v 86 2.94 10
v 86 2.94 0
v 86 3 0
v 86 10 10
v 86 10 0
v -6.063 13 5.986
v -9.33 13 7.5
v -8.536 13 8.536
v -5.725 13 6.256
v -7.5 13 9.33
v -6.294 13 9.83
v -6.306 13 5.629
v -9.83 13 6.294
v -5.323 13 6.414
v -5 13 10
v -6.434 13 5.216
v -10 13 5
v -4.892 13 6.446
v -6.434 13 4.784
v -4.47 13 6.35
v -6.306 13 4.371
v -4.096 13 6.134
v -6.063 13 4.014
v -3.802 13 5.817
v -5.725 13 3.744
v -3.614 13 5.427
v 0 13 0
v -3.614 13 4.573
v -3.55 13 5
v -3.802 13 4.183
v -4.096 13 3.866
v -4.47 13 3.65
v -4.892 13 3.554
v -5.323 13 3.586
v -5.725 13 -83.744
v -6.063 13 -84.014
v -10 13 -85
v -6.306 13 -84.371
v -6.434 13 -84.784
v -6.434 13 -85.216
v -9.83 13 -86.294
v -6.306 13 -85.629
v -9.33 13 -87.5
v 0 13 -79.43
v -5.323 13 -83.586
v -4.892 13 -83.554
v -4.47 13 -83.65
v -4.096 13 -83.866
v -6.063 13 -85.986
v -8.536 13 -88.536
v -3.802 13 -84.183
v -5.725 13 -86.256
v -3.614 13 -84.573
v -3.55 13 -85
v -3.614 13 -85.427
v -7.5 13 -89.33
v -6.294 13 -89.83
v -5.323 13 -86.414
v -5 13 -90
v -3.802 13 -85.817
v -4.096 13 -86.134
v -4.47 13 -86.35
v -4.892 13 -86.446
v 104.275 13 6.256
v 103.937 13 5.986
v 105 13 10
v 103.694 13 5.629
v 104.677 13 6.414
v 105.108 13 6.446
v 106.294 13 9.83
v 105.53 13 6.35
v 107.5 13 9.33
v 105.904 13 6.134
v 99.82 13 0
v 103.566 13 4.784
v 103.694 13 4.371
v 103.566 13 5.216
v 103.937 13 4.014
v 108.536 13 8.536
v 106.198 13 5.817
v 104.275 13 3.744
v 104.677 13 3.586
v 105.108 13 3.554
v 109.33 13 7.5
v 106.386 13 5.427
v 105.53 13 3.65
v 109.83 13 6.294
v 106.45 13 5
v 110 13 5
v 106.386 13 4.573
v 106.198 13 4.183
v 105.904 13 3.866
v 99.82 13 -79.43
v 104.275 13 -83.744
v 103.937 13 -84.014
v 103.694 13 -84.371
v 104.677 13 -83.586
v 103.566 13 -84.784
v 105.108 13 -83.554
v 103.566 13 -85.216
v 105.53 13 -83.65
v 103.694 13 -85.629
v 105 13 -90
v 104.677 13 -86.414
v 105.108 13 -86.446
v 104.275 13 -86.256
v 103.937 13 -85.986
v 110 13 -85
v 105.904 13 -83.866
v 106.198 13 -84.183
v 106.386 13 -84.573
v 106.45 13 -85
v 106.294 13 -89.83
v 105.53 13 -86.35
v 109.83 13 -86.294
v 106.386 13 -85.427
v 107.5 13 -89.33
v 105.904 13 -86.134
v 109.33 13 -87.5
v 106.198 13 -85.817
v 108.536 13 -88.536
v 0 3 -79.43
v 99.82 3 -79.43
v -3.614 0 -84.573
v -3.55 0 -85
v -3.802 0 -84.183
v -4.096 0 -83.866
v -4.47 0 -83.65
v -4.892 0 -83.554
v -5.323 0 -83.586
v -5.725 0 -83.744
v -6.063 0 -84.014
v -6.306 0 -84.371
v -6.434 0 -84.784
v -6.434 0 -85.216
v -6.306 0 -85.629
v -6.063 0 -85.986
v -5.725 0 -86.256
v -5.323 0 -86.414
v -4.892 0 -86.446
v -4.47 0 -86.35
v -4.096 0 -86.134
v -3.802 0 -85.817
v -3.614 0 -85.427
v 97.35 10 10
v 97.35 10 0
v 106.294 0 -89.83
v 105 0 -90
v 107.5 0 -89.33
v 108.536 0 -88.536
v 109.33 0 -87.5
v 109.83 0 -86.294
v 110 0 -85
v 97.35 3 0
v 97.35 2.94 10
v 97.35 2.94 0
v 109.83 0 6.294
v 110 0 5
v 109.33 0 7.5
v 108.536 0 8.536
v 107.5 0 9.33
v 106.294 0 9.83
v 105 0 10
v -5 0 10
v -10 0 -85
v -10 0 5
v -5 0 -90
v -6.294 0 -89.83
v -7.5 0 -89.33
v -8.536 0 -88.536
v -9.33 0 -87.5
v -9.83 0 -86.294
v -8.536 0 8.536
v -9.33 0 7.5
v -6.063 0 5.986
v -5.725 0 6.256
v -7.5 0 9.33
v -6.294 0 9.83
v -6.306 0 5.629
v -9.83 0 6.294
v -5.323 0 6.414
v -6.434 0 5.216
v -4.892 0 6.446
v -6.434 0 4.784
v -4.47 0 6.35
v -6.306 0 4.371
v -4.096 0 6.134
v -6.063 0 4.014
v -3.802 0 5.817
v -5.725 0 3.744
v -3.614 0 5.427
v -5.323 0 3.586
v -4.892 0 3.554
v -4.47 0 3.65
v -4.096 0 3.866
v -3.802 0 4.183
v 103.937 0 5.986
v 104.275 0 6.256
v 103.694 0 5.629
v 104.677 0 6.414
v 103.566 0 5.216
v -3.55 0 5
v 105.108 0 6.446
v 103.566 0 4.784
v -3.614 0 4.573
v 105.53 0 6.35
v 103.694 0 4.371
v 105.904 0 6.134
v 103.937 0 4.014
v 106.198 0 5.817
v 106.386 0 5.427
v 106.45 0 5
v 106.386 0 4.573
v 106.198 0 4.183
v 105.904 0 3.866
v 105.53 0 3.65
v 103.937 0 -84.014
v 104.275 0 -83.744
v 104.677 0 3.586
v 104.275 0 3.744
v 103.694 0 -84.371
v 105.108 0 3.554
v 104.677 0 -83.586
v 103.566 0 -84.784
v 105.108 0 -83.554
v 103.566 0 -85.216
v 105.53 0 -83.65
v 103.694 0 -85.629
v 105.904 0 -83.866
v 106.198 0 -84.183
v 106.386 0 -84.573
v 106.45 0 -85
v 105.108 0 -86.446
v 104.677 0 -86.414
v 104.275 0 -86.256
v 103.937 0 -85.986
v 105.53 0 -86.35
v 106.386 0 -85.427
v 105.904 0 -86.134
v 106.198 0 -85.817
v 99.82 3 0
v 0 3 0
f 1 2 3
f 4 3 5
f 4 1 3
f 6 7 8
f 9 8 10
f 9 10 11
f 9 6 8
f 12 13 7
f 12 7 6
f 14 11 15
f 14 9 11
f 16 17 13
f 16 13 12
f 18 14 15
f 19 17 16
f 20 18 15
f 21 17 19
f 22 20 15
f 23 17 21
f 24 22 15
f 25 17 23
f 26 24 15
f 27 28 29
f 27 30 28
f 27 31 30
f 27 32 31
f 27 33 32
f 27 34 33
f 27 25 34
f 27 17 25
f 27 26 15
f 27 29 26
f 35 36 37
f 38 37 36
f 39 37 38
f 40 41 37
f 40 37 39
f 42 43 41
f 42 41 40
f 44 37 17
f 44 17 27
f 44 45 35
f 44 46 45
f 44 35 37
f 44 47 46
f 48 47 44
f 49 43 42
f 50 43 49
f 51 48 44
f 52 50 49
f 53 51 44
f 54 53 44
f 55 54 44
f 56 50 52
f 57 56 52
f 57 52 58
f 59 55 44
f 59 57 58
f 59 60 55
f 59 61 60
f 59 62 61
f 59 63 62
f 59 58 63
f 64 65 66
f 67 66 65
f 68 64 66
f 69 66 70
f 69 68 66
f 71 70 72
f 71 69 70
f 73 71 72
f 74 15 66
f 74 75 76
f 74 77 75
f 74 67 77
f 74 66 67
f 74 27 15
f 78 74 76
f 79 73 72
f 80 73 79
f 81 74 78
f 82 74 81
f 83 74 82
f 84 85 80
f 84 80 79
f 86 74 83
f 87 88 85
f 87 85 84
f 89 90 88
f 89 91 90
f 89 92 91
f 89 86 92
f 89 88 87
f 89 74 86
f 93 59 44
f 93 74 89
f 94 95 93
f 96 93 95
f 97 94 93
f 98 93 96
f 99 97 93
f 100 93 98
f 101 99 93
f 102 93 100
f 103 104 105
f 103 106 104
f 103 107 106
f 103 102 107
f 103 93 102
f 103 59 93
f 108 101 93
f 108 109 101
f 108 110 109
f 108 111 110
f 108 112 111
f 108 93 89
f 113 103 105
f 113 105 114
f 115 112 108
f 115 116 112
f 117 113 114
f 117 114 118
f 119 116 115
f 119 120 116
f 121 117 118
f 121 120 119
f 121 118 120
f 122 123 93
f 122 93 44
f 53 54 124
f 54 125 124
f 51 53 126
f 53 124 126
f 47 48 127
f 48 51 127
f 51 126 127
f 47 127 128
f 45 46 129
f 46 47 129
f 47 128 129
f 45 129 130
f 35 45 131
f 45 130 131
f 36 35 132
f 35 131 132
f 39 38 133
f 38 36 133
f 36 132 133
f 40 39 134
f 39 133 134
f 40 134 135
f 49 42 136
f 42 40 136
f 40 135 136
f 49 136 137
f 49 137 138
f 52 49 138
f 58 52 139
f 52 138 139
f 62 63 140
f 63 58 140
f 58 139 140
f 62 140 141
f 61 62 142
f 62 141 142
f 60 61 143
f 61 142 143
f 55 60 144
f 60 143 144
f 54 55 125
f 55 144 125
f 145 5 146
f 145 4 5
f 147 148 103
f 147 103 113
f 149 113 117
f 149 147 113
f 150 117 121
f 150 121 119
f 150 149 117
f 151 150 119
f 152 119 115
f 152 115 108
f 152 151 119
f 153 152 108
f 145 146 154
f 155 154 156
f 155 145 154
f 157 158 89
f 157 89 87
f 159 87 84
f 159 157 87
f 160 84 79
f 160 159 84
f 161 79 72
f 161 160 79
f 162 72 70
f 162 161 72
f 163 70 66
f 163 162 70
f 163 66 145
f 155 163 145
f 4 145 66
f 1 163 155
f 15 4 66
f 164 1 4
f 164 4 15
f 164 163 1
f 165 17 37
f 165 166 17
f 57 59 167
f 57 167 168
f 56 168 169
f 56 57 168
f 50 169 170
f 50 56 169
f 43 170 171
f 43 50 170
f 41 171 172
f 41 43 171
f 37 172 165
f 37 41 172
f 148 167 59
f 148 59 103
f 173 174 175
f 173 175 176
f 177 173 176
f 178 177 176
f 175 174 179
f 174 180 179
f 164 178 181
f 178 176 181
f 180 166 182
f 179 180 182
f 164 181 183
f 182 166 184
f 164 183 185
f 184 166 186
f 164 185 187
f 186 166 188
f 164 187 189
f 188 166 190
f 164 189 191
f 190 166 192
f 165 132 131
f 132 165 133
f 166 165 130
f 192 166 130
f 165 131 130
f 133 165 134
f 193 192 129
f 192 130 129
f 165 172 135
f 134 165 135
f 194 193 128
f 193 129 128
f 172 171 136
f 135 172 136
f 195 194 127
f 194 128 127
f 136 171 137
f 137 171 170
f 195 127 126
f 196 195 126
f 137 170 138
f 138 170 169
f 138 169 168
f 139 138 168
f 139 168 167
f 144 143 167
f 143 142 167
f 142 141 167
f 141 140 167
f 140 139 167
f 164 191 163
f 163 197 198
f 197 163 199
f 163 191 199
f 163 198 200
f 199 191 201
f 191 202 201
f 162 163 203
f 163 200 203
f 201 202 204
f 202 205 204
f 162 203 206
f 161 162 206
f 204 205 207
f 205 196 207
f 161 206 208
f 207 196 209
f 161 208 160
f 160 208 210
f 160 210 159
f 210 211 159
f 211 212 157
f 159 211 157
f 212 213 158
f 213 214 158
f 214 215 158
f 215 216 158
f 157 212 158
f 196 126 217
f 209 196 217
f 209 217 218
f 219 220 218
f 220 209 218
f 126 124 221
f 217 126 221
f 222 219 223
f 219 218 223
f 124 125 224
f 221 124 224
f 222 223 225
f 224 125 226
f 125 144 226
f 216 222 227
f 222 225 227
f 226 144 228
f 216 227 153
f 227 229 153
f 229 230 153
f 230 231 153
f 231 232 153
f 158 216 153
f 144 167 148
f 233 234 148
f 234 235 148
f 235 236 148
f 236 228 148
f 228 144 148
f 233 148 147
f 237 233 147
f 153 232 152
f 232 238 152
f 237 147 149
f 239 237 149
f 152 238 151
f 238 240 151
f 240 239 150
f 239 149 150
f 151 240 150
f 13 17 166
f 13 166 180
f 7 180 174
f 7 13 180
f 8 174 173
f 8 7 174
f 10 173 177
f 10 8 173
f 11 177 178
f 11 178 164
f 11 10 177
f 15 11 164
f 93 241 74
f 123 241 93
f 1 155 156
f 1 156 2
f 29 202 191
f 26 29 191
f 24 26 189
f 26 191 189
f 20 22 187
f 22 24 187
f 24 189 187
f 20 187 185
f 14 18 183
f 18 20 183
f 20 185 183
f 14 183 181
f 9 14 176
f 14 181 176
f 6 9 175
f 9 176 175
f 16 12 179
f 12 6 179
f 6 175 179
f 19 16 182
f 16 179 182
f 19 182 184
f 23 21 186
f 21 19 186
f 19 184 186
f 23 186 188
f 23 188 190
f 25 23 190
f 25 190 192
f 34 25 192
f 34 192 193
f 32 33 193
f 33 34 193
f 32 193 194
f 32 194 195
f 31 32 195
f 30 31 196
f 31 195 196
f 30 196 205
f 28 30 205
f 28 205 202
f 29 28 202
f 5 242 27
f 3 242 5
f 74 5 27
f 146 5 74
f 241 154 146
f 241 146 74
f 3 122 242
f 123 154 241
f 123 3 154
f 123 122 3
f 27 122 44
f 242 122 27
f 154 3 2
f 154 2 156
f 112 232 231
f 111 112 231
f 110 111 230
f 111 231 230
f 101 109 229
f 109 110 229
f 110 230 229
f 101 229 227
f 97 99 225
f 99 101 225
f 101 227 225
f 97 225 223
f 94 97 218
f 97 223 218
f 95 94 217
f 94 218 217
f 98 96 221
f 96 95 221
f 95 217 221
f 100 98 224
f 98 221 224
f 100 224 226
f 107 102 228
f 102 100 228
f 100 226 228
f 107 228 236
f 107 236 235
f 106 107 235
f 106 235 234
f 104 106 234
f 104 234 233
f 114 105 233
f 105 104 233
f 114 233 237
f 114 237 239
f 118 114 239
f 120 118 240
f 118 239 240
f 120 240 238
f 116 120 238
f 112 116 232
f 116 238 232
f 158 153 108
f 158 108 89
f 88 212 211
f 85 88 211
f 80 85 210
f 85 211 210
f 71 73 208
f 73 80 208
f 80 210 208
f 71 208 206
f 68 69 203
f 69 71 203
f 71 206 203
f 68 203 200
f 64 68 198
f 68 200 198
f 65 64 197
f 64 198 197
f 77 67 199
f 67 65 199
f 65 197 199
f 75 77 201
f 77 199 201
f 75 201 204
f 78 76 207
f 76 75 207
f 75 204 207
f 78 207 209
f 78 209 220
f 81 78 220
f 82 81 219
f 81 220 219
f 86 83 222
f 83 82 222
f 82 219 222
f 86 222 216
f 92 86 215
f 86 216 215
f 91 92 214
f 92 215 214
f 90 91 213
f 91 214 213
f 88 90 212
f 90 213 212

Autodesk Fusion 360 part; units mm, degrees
sketch "hackpad base" plane through (0, 0, 0) normal (0, 1, 0) x (1, 0, 0)
  line L0 (0, 79.43) -> (0, 0)
  line L1 (0, 0) -> (99.82, 0)
  line L2 (99.82, 0) -> (99.82, 79.43)
  line L3 (99.82, 79.43) -> (0, 79.43)
  line L4 (-10, 90) -> (110, 90)
  line L5 (-10, -10) -> (-10, 90)
  line L6 (110, -10) -> (-10, -10)
  line L7 (110, 90) -> (110, -10)
  circle A0 centre (-5, -5) radius 1.45
  circle A1 centre (105, -5) radius 1.45
  circle A2 centre (105, 85) radius 1.45
  circle A3 centre (-5, 85) radius 1.45
extrude "Extrude1" add sketch "hackpad base" along normal blind 3 contours L0 L1 L2 L3 | L4 L5 L6 L7 makes body 1
extrude "Extrude2" add sketch "hackpad base" along normal blind 13 bodies 1
sketch "yes" plane through (0, 13, 0) normal (0, 1, 0) x (1, 0, 0)
  line L0 (4.775, 74.075) -> (17.775, 74.075)
  line L1 (4.775, 60.075) -> (17.775, 60.075)
  line L2 (4.275, 73.575) -> (4.275, 60.575)
  line L3 (18.275, 73.575) -> (18.275, 60.575)
  arc A0 (4.775, 74.075) -> (4.275, 73.575) centre (4.775, 73.575) ccw
  arc A1 (18.275, 73.575) -> (17.775, 74.075) centre (17.775, 73.575) ccw
  arc A2 (4.275, 60.575) -> (4.775, 60.075) centre (4.775, 60.575) ccw
  arc A3 (17.775, 60.075) -> (18.275, 60.575) centre (17.775, 60.575) ccw
  line L4 (23.825, 74.075) -> (36.825, 74.075)
  line L5 (23.825, 60.075) -> (36.825, 60.075)
  line L6 (23.325, 73.575) -> (23.325, 60.575)
  line L7 (37.325, 73.575) -> (37.325, 60.575)
  arc A4 (23.825, 74.075) -> (23.325, 73.575) centre (23.825, 73.575) ccw
  arc A5 (37.325, 73.575) -> (36.825, 74.075) centre (36.825, 73.575) ccw
  arc A6 (23.325, 60.575) -> (23.825, 60.075) centre (23.825, 60.575) ccw
  arc A7 (36.825, 60.075) -> (37.325, 60.575) centre (36.825, 60.575) ccw
  line L8 (42.875, 74.075) -> (55.875, 74.075)
  line L9 (42.875, 60.075) -> (55.875, 60.075)
  line L10 (42.375, 73.575) -> (42.375, 60.575)
  line L11 (56.375, 73.575) -> (56.375, 60.575)
  arc A8 (42.875, 74.075) -> (42.375, 73.575) centre (42.875, 73.575) ccw
  arc A9 (56.375, 73.575) -> (55.875, 74.075) centre (55.875, 73.575) ccw
  arc A10 (42.375, 60.575) -> (42.875, 60.075) centre (42.875, 60.575) ccw
  arc A11 (55.875, 60.075) -> (56.375, 60.575) centre (55.875, 60.575) ccw
  line L12 (61.925, 74.075) -> (74.925, 74.075)
  line L13 (61.925, 60.075) -> (74.925, 60.075)
  line L14 (61.425, 73.575) -> (61.425, 60.575)
  line L15 (75.425, 73.575) -> (75.425, 60.575)
  arc A12 (61.925, 74.075) -> (61.425, 73.575) centre (61.925, 73.575) ccw
  arc A13 (75.425, 73.575) -> (74.925, 74.075) centre (74.925, 73.575) ccw
  arc A14 (61.425, 60.575) -> (61.925, 60.075) centre (61.925, 60.575) ccw
  arc A15 (74.925, 60.075) -> (75.425, 60.575) centre (74.925, 60.575) ccw
  line L16 (4.775, 55.025) -> (17.775, 55.025)
  line L17 (4.775, 41.025) -> (17.775, 41.025)
  line L18 (4.275, 54.525) -> (4.275, 41.525)
  line L19 (18.275, 54.525) -> (18.275, 41.525)
  arc A16 (4.775, 55.025) -> (4.275, 54.525) centre (4.775, 54.525) ccw
  arc A17 (18.275, 54.525) -> (17.775, 55.025) centre (17.775, 54.525) ccw
  arc A18 (4.275, 41.525) -> (4.775, 41.025) centre (4.775, 41.525) ccw
  arc A19 (17.775, 41.025) -> (18.275, 41.525) centre (17.775, 41.525) ccw
  line L20 (23.825, 55.025) -> (36.825, 55.025)
  line L21 (23.825, 41.025) -> (36.825, 41.025)
  line L22 (23.325, 54.525) -> (23.325, 41.525)
  line L23 (37.325, 54.525) -> (37.325, 41.525)
  arc A20 (23.825, 55.025) -> (23.325, 54.525) centre (23.825, 54.525) ccw
  arc A21 (37.325, 54.525) -> (36.825, 55.025) centre (36.825, 54.525) ccw
  arc A22 (23.325, 41.525) -> (23.825, 41.025) centre (23.825, 41.525) ccw
  arc A23 (36.825, 41.025) -> (37.325, 41.525) centre (36.825, 41.525) ccw
  line L24 (42.875, 55.025) -> (55.875, 55.025)
  line L25 (42.875, 41.025) -> (55.875, 41.025)
  line L26 (42.375, 54.525) -> (42.375, 41.525)
  line L27 (56.375, 54.525) -> (56.375, 41.525)
  arc A24 (42.875, 55.025) -> (42.375, 54.525) centre (42.875, 54.525) ccw
  arc A25 (56.375, 54.525) -> (55.875, 55.025) centre (55.875, 54.525) ccw
  arc A26 (42.375, 41.525) -> (42.875, 41.025) centre (42.875, 41.525) ccw
  arc A27 (55.875, 41.025) -> (56.375, 41.525) centre (55.875, 41.525) ccw
  line L28 (61.925, 55.025) -> (74.925, 55.025)
  line L29 (61.925, 41.025) -> (74.925, 41.025)
  line L30 (61.425, 54.525) -> (61.425, 41.525)
  line L31 (75.425, 54.525) -> (75.425, 41.525)
  arc A28 (61.925, 55.025) -> (61.425, 54.525) centre (61.925, 54.525) ccw
  arc A29 (75.425, 54.525) -> (74.925, 55.025) centre (74.925, 54.525) ccw
  arc A30 (61.425, 41.525) -> (61.925, 41.025) centre (61.925, 41.525) ccw
  arc A31 (74.925, 41.025) -> (75.425, 41.525) centre (74.925, 41.525) ccw
  line L32 (4.775, 35.975) -> (17.775, 35.975)
  line L33 (4.775, 21.975) -> (17.775, 21.975)
  line L34 (4.275, 35.475) -> (4.275, 22.475)
  line L35 (18.275, 35.475) -> (18.275, 22.475)
  arc A32 (4.775, 35.975) -> (4.275, 35.475) centre (4.775, 35.475) ccw
  arc A33 (18.275, 35.475) -> (17.775, 35.975) centre (17.775, 35.475) ccw
  arc A34 (4.275, 22.475) -> (4.775, 21.975) centre (4.775, 22.475) ccw
  arc A35 (17.775, 21.975) -> (18.275, 22.475) centre (17.775, 22.475) ccw
  line L36 (23.825, 35.975) -> (36.825, 35.975)
  line L37 (23.825, 21.975) -> (36.825, 21.975)
  line L38 (23.325, 35.475) -> (23.325, 22.475)
  line L39 (37.325, 35.475) -> (37.325, 22.475)
  arc A36 (23.825, 35.975) -> (23.325, 35.475) centre (23.825, 35.475) ccw
  arc A37 (37.325, 35.475) -> (36.825, 35.975) centre (36.825, 35.475) ccw
  arc A38 (23.325, 22.475) -> (23.825, 21.975) centre (23.825, 22.475) ccw
  arc A39 (36.825, 21.975) -> (37.325, 22.475) centre (36.825, 22.475) ccw
  line L40 (42.875, 35.975) -> (55.875, 35.975)
  line L41 (42.875, 21.975) -> (55.875, 21.975)
  line L42 (42.375, 35.475) -> (42.375, 22.475)
  line L43 (56.375, 35.475) -> (56.375, 22.475)
  arc A40 (42.875, 35.975) -> (42.375, 35.475) centre (42.875, 35.475) ccw
  arc A41 (56.375, 35.475) -> (55.875, 35.975) centre (55.875, 35.475) ccw
  arc A42 (42.375, 22.475) -> (42.875, 21.975) centre (42.875, 22.475) ccw
  arc A43 (55.875, 21.975) -> (56.375, 22.475) centre (55.875, 22.475) ccw
  line L44 (61.925, 35.975) -> (74.925, 35.975)
  line L45 (61.925, 21.975) -> (74.925, 21.975)
  line L46 (61.425, 35.475) -> (61.425, 22.475)
  line L47 (75.425, 35.475) -> (75.425, 22.475)
  arc A44 (61.925, 35.975) -> (61.425, 35.475) centre (61.925, 35.475) ccw
  arc A45 (75.425, 35.475) -> (74.925, 35.975) centre (74.925, 35.475) ccw
  arc A46 (61.425, 22.475) -> (61.925, 21.975) centre (61.925, 22.475) ccw
  arc A47 (74.925, 21.975) -> (75.425, 22.475) centre (74.925, 22.475) ccw
  line L48 (4.775, 16.925) -> (17.775, 16.925)
  line L49 (4.775, 2.925) -> (17.775, 2.925)
  line L50 (4.275, 16.425) -> (4.275, 3.425)
  line L51 (18.275, 16.425) -> (18.275, 3.425)
  arc A48 (4.775, 16.925) -> (4.275, 16.425) centre (4.775, 16.425) ccw
  arc A49 (18.275, 16.425) -> (17.775, 16.925) centre (17.775, 16.425) ccw
  arc A50 (4.275, 3.425) -> (4.775, 2.925) centre (4.775, 3.425) ccw
  arc A51 (17.775, 2.925) -> (18.275, 3.425) centre (17.775, 3.425) ccw
  line L52 (23.825, 16.925) -> (36.825, 16.925)
  line L53 (23.825, 2.925) -> (36.825, 2.925)
  line L54 (23.325, 16.425) -> (23.325, 3.425)
  line L55 (37.325, 16.425) -> (37.325, 3.425)
  arc A52 (23.825, 16.925) -> (23.325, 16.425) centre (23.825, 16.425) ccw
  arc A53 (37.325, 16.425) -> (36.825, 16.925) centre (36.825, 16.425) ccw
  arc A54 (23.325, 3.425) -> (23.825, 2.925) centre (23.825, 3.425) ccw
  arc A55 (36.825, 2.925) -> (37.325, 3.425) centre (36.825, 3.425) ccw
  line L56 (42.875, 16.925) -> (55.875, 16.925)
  line L57 (42.875, 2.925) -> (55.875, 2.925)
  line L58 (42.375, 16.425) -> (42.375, 3.425)
  line L59 (56.375, 16.425) -> (56.375, 3.425)
  arc A56 (42.875, 16.925) -> (42.375, 16.425) centre (42.875, 16.425) ccw
  arc A57 (56.375, 16.425) -> (55.875, 16.925) centre (55.875, 16.425) ccw
  arc A58 (42.375, 3.425) -> (42.875, 2.925) centre (42.875, 3.425) ccw
  arc A59 (55.875, 2.925) -> (56.375, 3.425) centre (55.875, 3.425) ccw
  line L60 (61.925, 16.925) -> (74.925, 16.925)
  line L61 (61.925, 2.925) -> (74.925, 2.925)
  line L62 (61.425, 16.425) -> (61.425, 3.425)
  line L63 (75.425, 16.425) -> (75.425, 3.425)
  arc A60 (61.925, 16.925) -> (61.425, 16.425) centre (61.925, 16.425) ccw
  arc A61 (75.425, 16.425) -> (74.925, 16.925) centre (74.925, 16.425) ccw
  arc A62 (61.425, 3.425) -> (61.925, 2.925) centre (61.925, 3.425) ccw
  arc A63 (74.925, 2.925) -> (75.425, 3.425) centre (74.925, 3.425) ccw
  line L64 (1.75, 0.4) -> (77.95, 0.4)
  line L65 (1.75, 76.6) -> (77.95, 76.6)
  line L66 (1.75, 0.4) -> (1.75, 76.6)
  line L67 (77.95, 0.4) -> (77.95, 76.6)
sketch "Sketch3" plane through (0, 13, 0) normal (0, 1, 0) x (-1, 0, 0)
  circle A0 centre (5, 5) radius 1.45
  line L0 (0, -79.43) -> (-99.82, -79.43)
  line L1 (-99.82, -79.43) -> (-99.82, 0)
  line L2 (-99.82, 0) -> (0, 0)
  line L3 (0, 0) -> (0, -79.43)
  circle A1 centre (-105, 5) radius 1.45
  circle A2 centre (5, -85) radius 1.45
  circle A3 centre (-105, -85) radius 1.45
  line L4 (-110, -90) -> (10, -90)
  line L5 (10, -90) -> (10, 10)
  line L6 (10, 10) -> (-110, 10)
  line L7 (-110, 10) -> (-110, -90)
  line L8 (0, -79.43) -> (-99.82, -79.43)
  line L9 (-99.82, -79.43) -> (-99.82, 0)
  line L10 (-99.82, 0) -> (0, 0)
  line L11 (0, 0) -> (0, -79.43)
extrude "Extrude3" add sketch "Sketch3" along normal blind 3 separate body contours L0 L1 L2 L3 L8 L9 L10 L11 | L4 L5 L6 L7 makes body 2
extrude "Extrude4" cut sketch "yes" along normal blind 5 contours L0 L1 L2 L3 A0 A1 A2 A3 | L4 L5 L6 L7 A4 A5 A6 A7 | L8 L9 L10 L11 A8 A9 A10 A11 | L12 L13 L14 L15 A12 A13 A14 A15 | L16 L17 L18 L19 A16 A17 A18 A19 | L20 L21 L22 L23 A20 A21 A22 A23 | L24 L25 L26 L27 A24 A25 A26 A27 | L28 L29 L30 L31 A28 A29 A30 A31 | L32 L33 L34 L35 A32 A33 A34 A35 | L36 L37 L38 L39 A36 A37 A38 A39 | L40 L41 L42 L43 A40 A41 A42 A43 | L44 L45 L46 L47 A44 A45 A46 A47 | L48 L49 L50 L51 A48 A49 A50 A51 | L52 L53 L54 L55 A52 A53 A54 A55 | L56 L57 L58 L59 A56 A57 A58 A59 | L60 L61 L62 L63 A60 A61 A62 A63 bodies 2
fillet "Fillet1" radius 5 8 edges at (-10, 6.5, 10) (-10, 6.5, -90) (110, 6.5, -90) (110, 6.5, 10) (-10, 14.5, 10) (-10, 14.5, -90) (110, 14.5, -90) (110, 14.5, 10) on bodies 1 2
sketch "Sketch4" plane through (0, 16, 0) normal (0, 1, 0) x (-1, 0, 0)
  arc A0 (-105, 10) -> (-110, 5) centre (-105, 5) ccw
  line L0 (-110, 5) -> (-110, -85)
  arc A1 (-110, -85) -> (-105, -90) centre (-105, -85) ccw
  line L1 (-105, -90) -> (5, -90)
  arc A2 (5, -90) -> (10, -85) centre (5, -85) ccw
  line L2 (10, -85) -> (10, 5)
  arc A3 (10, 5) -> (5, 10) centre (5, 5) ccw
  line L3 (5, 10) -> (-105, 10)
  line L4 (-4.775, -35.975) -> (-17.775, -35.975)
  arc A4 (-18.275, -35.475) -> (-17.775, -35.975) centre (-17.775, -35.475) ccw
  line L5 (-18.275, -35.475) -> (-18.275, -22.475)
  arc A5 (-17.775, -21.975) -> (-18.275, -22.475) centre (-17.775, -22.475) ccw
  line L6 (-17.775, -21.975) -> (-4.775, -21.975)
  arc A6 (-4.275, -22.475) -> (-4.775, -21.975) centre (-4.775, -22.475) ccw
  line L7 (-4.275, -22.475) -> (-4.275, -35.475)
  arc A7 (-4.775, -35.975) -> (-4.275, -35.475) centre (-4.775, -35.475) ccw
  line L8 (-4.775, -74.075) -> (-17.775, -74.075)
  arc A8 (-18.275, -73.575) -> (-17.775, -74.075) centre (-17.775, -73.575) ccw
  line L9 (-18.275, -73.575) -> (-18.275, -60.575)
  arc A9 (-17.775, -60.075) -> (-18.275, -60.575) centre (-17.775, -60.575) ccw
  line L10 (-17.775, -60.075) -> (-4.775, -60.075)
  arc A10 (-4.275, -60.575) -> (-4.775, -60.075) centre (-4.775, -60.575) ccw
  line L11 (-4.275, -60.575) -> (-4.275, -73.575)
  arc A11 (-4.775, -74.075) -> (-4.275, -73.575) centre (-4.775, -73.575) ccw
  line L12 (-42.875, -55.025) -> (-55.875, -55.025)
  arc A12 (-56.375, -54.525) -> (-55.875, -55.025) centre (-55.875, -54.525) ccw
  line L13 (-56.375, -54.525) -> (-56.375, -41.525)
  arc A13 (-55.875, -41.025) -> (-56.375, -41.525) centre (-55.875, -41.525) ccw
  line L14 (-55.875, -41.025) -> (-42.875, -41.025)
  arc A14 (-42.375, -41.525) -> (-42.875, -41.025) centre (-42.875, -41.525) ccw
  line L15 (-42.375, -41.525) -> (-42.375, -54.525)
  arc A15 (-42.875, -55.025) -> (-42.375, -54.525) centre (-42.875, -54.525) ccw
  line L16 (-61.925, -16.925) -> (-74.925, -16.925)
  arc A16 (-75.425, -16.425) -> (-74.925, -16.925) centre (-74.925, -16.425) ccw
  line L17 (-75.425, -16.425) -> (-75.425, -3.425)
  arc A17 (-74.925, -2.925) -> (-75.425, -3.425) centre (-74.925, -3.425) ccw
  line L18 (-74.925, -2.925) -> (-61.925, -2.925)
  arc A18 (-61.425, -3.425) -> (-61.925, -2.925) centre (-61.925, -3.425) ccw
  line L19 (-61.425, -3.425) -> (-61.425, -16.425)
  arc A19 (-61.925, -16.925) -> (-61.425, -16.425) centre (-61.925, -16.425) ccw
  line L20 (-61.925, -35.975) -> (-74.925, -35.975)
  arc A20 (-75.425, -35.475) -> (-74.925, -35.975) centre (-74.925, -35.475) ccw
  line L21 (-75.425, -35.475) -> (-75.425, -22.475)
  arc A21 (-74.925, -21.975) -> (-75.425, -22.475) centre (-74.925, -22.475) ccw
  line L22 (-74.925, -21.975) -> (-61.925, -21.975)
  arc A22 (-61.425, -22.475) -> (-61.925, -21.975) centre (-61.925, -22.475) ccw
  line L23 (-61.425, -22.475) -> (-61.425, -35.475)
  arc A23 (-61.925, -35.975) -> (-61.425, -35.475) centre (-61.925, -35.475) ccw
  line L24 (-61.925, -74.075) -> (-74.925, -74.075)
  arc A24 (-75.425, -73.575) -> (-74.925, -74.075) centre (-74.925, -73.575) ccw
  line L25 (-75.425, -73.575) -> (-75.425, -60.575)
  arc A25 (-74.925, -60.075) -> (-75.425, -60.575) centre (-74.925, -60.575) ccw
  line L26 (-74.925, -60.075) -> (-61.925, -60.075)
  arc A26 (-61.425, -60.575) -> (-61.925, -60.075) centre (-61.925, -60.575) ccw
  line L27 (-61.425, -60.575) -> (-61.425, -73.575)
  arc A27 (-61.925, -74.075) -> (-61.425, -73.575) centre (-61.925, -73.575) ccw
  line L28 (-4.775, -55.025) -> (-17.775, -55.025)
  arc A28 (-18.275, -54.525) -> (-17.775, -55.025) centre (-17.775, -54.525) ccw
  line L29 (-18.275, -54.525) -> (-18.275, -41.525)
  arc A29 (-17.775, -41.025) -> (-18.275, -41.525) centre (-17.775, -41.525) ccw
  line L30 (-17.775, -41.025) -> (-4.775, -41.025)
  arc A30 (-4.275, -41.525) -> (-4.775, -41.025) centre (-4.775, -41.525) ccw
  line L31 (-4.275, -41.525) -> (-4.275, -54.525)
  arc A31 (-4.775, -55.025) -> (-4.275, -54.525) centre (-4.775, -54.525) ccw
  line L32 (-4.775, -16.925) -> (-17.775, -16.925)
  arc A32 (-18.275, -16.425) -> (-17.775, -16.925) centre (-17.775, -16.425) ccw
  line L33 (-18.275, -16.425) -> (-18.275, -3.425)
  arc A33 (-17.775, -2.925) -> (-18.275, -3.425) centre (-17.775, -3.425) ccw
  line L34 (-17.775, -2.925) -> (-4.775, -2.925)
  arc A34 (-4.275, -3.425) -> (-4.775, -2.925) centre (-4.775, -3.425) ccw
  line L35 (-4.275, -3.425) -> (-4.275, -16.425)
  arc A35 (-4.775, -16.925) -> (-4.275, -16.425) centre (-4.775, -16.425) ccw
  line L36 (-23.825, -35.975) -> (-36.825, -35.975)
  arc A36 (-37.325, -35.475) -> (-36.825, -35.975) centre (-36.825, -35.475) ccw
  line L37 (-37.325, -35.475) -> (-37.325, -22.475)
  arc A37 (-36.825, -21.975) -> (-37.325, -22.475) centre (-36.825, -22.475) ccw
  line L38 (-36.825, -21.975) -> (-23.825, -21.975)
  arc A38 (-23.325, -22.475) -> (-23.825, -21.975) centre (-23.825, -22.475) ccw
  line L39 (-23.325, -22.475) -> (-23.325, -35.475)
  arc A39 (-23.825, -35.975) -> (-23.325, -35.475) centre (-23.825, -35.475) ccw
  line L40 (-23.825, -74.075) -> (-36.825, -74.075)
  arc A40 (-37.325, -73.575) -> (-36.825, -74.075) centre (-36.825, -73.575) ccw
  line L41 (-37.325, -73.575) -> (-37.325, -60.575)
  arc A41 (-36.825, -60.075) -> (-37.325, -60.575) centre (-36.825, -60.575) ccw
  line L42 (-36.825, -60.075) -> (-23.825, -60.075)
  arc A42 (-23.325, -60.575) -> (-23.825, -60.075) centre (-23.825, -60.575) ccw
  line L43 (-23.325, -60.575) -> (-23.325, -73.575)
  arc A43 (-23.825, -74.075) -> (-23.325, -73.575) centre (-23.825, -73.575) ccw
  line L44 (-61.925, -55.025) -> (-74.925, -55.025)
  arc A44 (-75.425, -54.525) -> (-74.925, -55.025) centre (-74.925, -54.525) ccw
  line L45 (-75.425, -54.525) -> (-75.425, -41.525)
  arc A45 (-74.925, -41.025) -> (-75.425, -41.525) centre (-74.925, -41.525) ccw
  line L46 (-74.925, -41.025) -> (-61.925, -41.025)
  arc A46 (-61.425, -41.525) -> (-61.925, -41.025) centre (-61.925, -41.525) ccw
  line L47 (-61.425, -41.525) -> (-61.425, -54.525)
  arc A47 (-61.925, -55.025) -> (-61.425, -54.525) centre (-61.925, -54.525) ccw
  line L48 (-42.875, -16.925) -> (-55.875, -16.925)
  arc A48 (-56.375, -16.425) -> (-55.875, -16.925) centre (-55.875, -16.425) ccw
  line L49 (-56.375, -16.425) -> (-56.375, -3.425)
  arc A49 (-55.875, -2.925) -> (-56.375, -3.425) centre (-55.875, -3.425) ccw
  line L50 (-55.875, -2.925) -> (-42.875, -2.925)
  arc A50 (-42.375, -3.425) -> (-42.875, -2.925) centre (-42.875, -3.425) ccw
  line L51 (-42.375, -3.425) -> (-42.375, -16.425)
  arc A51 (-42.875, -16.925) -> (-42.375, -16.425) centre (-42.875, -16.425) ccw
  line L52 (-42.875, -35.975) -> (-55.875, -35.975)
  arc A52 (-56.375, -35.475) -> (-55.875, -35.975) centre (-55.875, -35.475) ccw
  line L53 (-56.375, -35.475) -> (-56.375, -22.475)
  arc A53 (-55.875, -21.975) -> (-56.375, -22.475) centre (-55.875, -22.475) ccw
  line L54 (-55.875, -21.975) -> (-42.875, -21.975)
  arc A54 (-42.375, -22.475) -> (-42.875, -21.975) centre (-42.875, -22.475) ccw
  line L55 (-42.375, -22.475) -> (-42.375, -35.475)
  arc A55 (-42.875, -35.975) -> (-42.375, -35.475) centre (-42.875, -35.475) ccw
  line L56 (-42.875, -74.075) -> (-55.875, -74.075)
  arc A56 (-56.375, -73.575) -> (-55.875, -74.075) centre (-55.875, -73.575) ccw
  line L57 (-56.375, -73.575) -> (-56.375, -60.575)
  arc A57 (-55.875, -60.075) -> (-56.375, -60.575) centre (-55.875, -60.575) ccw
  line L58 (-55.875, -60.075) -> (-42.875, -60.075)
  arc A58 (-42.375, -60.575) -> (-42.875, -60.075) centre (-42.875, -60.575) ccw
  line L59 (-42.375, -60.575) -> (-42.375, -73.575)
  arc A59 (-42.875, -74.075) -> (-42.375, -73.575) centre (-42.875, -73.575) ccw
  line L60 (-23.825, -55.025) -> (-36.825, -55.025)
  arc A60 (-37.325, -54.525) -> (-36.825, -55.025) centre (-36.825, -54.525) ccw
  line L61 (-37.325, -54.525) -> (-37.325, -41.525)
  arc A61 (-36.825, -41.025) -> (-37.325, -41.525) centre (-36.825, -41.525) ccw
  line L62 (-36.825, -41.025) -> (-23.825, -41.025)
  arc A62 (-23.325, -41.525) -> (-23.825, -41.025) centre (-23.825, -41.525) ccw
  line L63 (-23.325, -41.525) -> (-23.325, -54.525)
  arc A63 (-23.825, -55.025) -> (-23.325, -54.525) centre (-23.825, -54.525) ccw
  line L64 (-23.825, -16.925) -> (-36.825, -16.925)
  arc A64 (-37.325, -16.425) -> (-36.825, -16.925) centre (-36.825, -16.425) ccw
  line L65 (-37.325, -16.425) -> (-37.325, -3.425)
  arc A65 (-36.825, -2.925) -> (-37.325, -3.425) centre (-36.825, -3.425) ccw
  line L66 (-36.825, -2.925) -> (-23.825, -2.925)
  arc A66 (-23.325, -3.425) -> (-23.825, -2.925) centre (-23.825, -3.425) ccw
  line L67 (-23.325, -3.425) -> (-23.325, -16.425)
  arc A67 (-23.825, -16.925) -> (-23.325, -16.425) centre (-23.825, -16.425) ccw
  circle A68 centre (5, -85) radius 1.45
  circle A69 centre (-105, 5) radius 1.45
  circle A70 centre (5, 5) radius 1.45
  circle A71 centre (-105, -85) radius 1.45
  line L68 (-94.275, -68.595) -> (-82.275, -68.595)
  line L69 (-82.275, -68.595) -> (-82.275, -39.095)
  line L70 (-82.275, -39.095) -> (-94.275, -39.095)
  line L71 (-94.275, -39.095) -> (-94.275, -68.595)
  line L72 (-99.82, -79.43) -> (0, -79.43)
  line L73 (-77.95, -0.4) -> (-77.95, -76.6)
  dimension "d11" = 12
  dimension "d12" = 29.5
  dimension "d13" = 10.835
  dimension "d14" = 4.325
extrude "Extrude5" cut sketch "Sketch4" against normal blind 5 contours L68 L69 L70 L71 bodies 2
sketch "Sketch5" plane through (0, 0, 10) normal (0, 0, 1) x (1, 0, 0)
  line L0 (105, 0) -> (105, 13)
  line L1 (105, 13) -> (-5, 13)
  line L2 (-5, 13) -> (-5, 0)
  line L3 (-5, 0) -> (105, 0)
  line L4 (97.35, 2.9398) -> (86, 2.9398)
  line L5 (86, 2.9398) -> (86, 10)
  line L6 (86, 10) -> (97.35, 10)
  line L7 (97.35, 10) -> (97.35, 2.9398)
extrude "Extrude6" cut sketch "Sketch5" against normal blind 10 contours L4 L5 L6 L7 bodies 1
hidden bodies 2
